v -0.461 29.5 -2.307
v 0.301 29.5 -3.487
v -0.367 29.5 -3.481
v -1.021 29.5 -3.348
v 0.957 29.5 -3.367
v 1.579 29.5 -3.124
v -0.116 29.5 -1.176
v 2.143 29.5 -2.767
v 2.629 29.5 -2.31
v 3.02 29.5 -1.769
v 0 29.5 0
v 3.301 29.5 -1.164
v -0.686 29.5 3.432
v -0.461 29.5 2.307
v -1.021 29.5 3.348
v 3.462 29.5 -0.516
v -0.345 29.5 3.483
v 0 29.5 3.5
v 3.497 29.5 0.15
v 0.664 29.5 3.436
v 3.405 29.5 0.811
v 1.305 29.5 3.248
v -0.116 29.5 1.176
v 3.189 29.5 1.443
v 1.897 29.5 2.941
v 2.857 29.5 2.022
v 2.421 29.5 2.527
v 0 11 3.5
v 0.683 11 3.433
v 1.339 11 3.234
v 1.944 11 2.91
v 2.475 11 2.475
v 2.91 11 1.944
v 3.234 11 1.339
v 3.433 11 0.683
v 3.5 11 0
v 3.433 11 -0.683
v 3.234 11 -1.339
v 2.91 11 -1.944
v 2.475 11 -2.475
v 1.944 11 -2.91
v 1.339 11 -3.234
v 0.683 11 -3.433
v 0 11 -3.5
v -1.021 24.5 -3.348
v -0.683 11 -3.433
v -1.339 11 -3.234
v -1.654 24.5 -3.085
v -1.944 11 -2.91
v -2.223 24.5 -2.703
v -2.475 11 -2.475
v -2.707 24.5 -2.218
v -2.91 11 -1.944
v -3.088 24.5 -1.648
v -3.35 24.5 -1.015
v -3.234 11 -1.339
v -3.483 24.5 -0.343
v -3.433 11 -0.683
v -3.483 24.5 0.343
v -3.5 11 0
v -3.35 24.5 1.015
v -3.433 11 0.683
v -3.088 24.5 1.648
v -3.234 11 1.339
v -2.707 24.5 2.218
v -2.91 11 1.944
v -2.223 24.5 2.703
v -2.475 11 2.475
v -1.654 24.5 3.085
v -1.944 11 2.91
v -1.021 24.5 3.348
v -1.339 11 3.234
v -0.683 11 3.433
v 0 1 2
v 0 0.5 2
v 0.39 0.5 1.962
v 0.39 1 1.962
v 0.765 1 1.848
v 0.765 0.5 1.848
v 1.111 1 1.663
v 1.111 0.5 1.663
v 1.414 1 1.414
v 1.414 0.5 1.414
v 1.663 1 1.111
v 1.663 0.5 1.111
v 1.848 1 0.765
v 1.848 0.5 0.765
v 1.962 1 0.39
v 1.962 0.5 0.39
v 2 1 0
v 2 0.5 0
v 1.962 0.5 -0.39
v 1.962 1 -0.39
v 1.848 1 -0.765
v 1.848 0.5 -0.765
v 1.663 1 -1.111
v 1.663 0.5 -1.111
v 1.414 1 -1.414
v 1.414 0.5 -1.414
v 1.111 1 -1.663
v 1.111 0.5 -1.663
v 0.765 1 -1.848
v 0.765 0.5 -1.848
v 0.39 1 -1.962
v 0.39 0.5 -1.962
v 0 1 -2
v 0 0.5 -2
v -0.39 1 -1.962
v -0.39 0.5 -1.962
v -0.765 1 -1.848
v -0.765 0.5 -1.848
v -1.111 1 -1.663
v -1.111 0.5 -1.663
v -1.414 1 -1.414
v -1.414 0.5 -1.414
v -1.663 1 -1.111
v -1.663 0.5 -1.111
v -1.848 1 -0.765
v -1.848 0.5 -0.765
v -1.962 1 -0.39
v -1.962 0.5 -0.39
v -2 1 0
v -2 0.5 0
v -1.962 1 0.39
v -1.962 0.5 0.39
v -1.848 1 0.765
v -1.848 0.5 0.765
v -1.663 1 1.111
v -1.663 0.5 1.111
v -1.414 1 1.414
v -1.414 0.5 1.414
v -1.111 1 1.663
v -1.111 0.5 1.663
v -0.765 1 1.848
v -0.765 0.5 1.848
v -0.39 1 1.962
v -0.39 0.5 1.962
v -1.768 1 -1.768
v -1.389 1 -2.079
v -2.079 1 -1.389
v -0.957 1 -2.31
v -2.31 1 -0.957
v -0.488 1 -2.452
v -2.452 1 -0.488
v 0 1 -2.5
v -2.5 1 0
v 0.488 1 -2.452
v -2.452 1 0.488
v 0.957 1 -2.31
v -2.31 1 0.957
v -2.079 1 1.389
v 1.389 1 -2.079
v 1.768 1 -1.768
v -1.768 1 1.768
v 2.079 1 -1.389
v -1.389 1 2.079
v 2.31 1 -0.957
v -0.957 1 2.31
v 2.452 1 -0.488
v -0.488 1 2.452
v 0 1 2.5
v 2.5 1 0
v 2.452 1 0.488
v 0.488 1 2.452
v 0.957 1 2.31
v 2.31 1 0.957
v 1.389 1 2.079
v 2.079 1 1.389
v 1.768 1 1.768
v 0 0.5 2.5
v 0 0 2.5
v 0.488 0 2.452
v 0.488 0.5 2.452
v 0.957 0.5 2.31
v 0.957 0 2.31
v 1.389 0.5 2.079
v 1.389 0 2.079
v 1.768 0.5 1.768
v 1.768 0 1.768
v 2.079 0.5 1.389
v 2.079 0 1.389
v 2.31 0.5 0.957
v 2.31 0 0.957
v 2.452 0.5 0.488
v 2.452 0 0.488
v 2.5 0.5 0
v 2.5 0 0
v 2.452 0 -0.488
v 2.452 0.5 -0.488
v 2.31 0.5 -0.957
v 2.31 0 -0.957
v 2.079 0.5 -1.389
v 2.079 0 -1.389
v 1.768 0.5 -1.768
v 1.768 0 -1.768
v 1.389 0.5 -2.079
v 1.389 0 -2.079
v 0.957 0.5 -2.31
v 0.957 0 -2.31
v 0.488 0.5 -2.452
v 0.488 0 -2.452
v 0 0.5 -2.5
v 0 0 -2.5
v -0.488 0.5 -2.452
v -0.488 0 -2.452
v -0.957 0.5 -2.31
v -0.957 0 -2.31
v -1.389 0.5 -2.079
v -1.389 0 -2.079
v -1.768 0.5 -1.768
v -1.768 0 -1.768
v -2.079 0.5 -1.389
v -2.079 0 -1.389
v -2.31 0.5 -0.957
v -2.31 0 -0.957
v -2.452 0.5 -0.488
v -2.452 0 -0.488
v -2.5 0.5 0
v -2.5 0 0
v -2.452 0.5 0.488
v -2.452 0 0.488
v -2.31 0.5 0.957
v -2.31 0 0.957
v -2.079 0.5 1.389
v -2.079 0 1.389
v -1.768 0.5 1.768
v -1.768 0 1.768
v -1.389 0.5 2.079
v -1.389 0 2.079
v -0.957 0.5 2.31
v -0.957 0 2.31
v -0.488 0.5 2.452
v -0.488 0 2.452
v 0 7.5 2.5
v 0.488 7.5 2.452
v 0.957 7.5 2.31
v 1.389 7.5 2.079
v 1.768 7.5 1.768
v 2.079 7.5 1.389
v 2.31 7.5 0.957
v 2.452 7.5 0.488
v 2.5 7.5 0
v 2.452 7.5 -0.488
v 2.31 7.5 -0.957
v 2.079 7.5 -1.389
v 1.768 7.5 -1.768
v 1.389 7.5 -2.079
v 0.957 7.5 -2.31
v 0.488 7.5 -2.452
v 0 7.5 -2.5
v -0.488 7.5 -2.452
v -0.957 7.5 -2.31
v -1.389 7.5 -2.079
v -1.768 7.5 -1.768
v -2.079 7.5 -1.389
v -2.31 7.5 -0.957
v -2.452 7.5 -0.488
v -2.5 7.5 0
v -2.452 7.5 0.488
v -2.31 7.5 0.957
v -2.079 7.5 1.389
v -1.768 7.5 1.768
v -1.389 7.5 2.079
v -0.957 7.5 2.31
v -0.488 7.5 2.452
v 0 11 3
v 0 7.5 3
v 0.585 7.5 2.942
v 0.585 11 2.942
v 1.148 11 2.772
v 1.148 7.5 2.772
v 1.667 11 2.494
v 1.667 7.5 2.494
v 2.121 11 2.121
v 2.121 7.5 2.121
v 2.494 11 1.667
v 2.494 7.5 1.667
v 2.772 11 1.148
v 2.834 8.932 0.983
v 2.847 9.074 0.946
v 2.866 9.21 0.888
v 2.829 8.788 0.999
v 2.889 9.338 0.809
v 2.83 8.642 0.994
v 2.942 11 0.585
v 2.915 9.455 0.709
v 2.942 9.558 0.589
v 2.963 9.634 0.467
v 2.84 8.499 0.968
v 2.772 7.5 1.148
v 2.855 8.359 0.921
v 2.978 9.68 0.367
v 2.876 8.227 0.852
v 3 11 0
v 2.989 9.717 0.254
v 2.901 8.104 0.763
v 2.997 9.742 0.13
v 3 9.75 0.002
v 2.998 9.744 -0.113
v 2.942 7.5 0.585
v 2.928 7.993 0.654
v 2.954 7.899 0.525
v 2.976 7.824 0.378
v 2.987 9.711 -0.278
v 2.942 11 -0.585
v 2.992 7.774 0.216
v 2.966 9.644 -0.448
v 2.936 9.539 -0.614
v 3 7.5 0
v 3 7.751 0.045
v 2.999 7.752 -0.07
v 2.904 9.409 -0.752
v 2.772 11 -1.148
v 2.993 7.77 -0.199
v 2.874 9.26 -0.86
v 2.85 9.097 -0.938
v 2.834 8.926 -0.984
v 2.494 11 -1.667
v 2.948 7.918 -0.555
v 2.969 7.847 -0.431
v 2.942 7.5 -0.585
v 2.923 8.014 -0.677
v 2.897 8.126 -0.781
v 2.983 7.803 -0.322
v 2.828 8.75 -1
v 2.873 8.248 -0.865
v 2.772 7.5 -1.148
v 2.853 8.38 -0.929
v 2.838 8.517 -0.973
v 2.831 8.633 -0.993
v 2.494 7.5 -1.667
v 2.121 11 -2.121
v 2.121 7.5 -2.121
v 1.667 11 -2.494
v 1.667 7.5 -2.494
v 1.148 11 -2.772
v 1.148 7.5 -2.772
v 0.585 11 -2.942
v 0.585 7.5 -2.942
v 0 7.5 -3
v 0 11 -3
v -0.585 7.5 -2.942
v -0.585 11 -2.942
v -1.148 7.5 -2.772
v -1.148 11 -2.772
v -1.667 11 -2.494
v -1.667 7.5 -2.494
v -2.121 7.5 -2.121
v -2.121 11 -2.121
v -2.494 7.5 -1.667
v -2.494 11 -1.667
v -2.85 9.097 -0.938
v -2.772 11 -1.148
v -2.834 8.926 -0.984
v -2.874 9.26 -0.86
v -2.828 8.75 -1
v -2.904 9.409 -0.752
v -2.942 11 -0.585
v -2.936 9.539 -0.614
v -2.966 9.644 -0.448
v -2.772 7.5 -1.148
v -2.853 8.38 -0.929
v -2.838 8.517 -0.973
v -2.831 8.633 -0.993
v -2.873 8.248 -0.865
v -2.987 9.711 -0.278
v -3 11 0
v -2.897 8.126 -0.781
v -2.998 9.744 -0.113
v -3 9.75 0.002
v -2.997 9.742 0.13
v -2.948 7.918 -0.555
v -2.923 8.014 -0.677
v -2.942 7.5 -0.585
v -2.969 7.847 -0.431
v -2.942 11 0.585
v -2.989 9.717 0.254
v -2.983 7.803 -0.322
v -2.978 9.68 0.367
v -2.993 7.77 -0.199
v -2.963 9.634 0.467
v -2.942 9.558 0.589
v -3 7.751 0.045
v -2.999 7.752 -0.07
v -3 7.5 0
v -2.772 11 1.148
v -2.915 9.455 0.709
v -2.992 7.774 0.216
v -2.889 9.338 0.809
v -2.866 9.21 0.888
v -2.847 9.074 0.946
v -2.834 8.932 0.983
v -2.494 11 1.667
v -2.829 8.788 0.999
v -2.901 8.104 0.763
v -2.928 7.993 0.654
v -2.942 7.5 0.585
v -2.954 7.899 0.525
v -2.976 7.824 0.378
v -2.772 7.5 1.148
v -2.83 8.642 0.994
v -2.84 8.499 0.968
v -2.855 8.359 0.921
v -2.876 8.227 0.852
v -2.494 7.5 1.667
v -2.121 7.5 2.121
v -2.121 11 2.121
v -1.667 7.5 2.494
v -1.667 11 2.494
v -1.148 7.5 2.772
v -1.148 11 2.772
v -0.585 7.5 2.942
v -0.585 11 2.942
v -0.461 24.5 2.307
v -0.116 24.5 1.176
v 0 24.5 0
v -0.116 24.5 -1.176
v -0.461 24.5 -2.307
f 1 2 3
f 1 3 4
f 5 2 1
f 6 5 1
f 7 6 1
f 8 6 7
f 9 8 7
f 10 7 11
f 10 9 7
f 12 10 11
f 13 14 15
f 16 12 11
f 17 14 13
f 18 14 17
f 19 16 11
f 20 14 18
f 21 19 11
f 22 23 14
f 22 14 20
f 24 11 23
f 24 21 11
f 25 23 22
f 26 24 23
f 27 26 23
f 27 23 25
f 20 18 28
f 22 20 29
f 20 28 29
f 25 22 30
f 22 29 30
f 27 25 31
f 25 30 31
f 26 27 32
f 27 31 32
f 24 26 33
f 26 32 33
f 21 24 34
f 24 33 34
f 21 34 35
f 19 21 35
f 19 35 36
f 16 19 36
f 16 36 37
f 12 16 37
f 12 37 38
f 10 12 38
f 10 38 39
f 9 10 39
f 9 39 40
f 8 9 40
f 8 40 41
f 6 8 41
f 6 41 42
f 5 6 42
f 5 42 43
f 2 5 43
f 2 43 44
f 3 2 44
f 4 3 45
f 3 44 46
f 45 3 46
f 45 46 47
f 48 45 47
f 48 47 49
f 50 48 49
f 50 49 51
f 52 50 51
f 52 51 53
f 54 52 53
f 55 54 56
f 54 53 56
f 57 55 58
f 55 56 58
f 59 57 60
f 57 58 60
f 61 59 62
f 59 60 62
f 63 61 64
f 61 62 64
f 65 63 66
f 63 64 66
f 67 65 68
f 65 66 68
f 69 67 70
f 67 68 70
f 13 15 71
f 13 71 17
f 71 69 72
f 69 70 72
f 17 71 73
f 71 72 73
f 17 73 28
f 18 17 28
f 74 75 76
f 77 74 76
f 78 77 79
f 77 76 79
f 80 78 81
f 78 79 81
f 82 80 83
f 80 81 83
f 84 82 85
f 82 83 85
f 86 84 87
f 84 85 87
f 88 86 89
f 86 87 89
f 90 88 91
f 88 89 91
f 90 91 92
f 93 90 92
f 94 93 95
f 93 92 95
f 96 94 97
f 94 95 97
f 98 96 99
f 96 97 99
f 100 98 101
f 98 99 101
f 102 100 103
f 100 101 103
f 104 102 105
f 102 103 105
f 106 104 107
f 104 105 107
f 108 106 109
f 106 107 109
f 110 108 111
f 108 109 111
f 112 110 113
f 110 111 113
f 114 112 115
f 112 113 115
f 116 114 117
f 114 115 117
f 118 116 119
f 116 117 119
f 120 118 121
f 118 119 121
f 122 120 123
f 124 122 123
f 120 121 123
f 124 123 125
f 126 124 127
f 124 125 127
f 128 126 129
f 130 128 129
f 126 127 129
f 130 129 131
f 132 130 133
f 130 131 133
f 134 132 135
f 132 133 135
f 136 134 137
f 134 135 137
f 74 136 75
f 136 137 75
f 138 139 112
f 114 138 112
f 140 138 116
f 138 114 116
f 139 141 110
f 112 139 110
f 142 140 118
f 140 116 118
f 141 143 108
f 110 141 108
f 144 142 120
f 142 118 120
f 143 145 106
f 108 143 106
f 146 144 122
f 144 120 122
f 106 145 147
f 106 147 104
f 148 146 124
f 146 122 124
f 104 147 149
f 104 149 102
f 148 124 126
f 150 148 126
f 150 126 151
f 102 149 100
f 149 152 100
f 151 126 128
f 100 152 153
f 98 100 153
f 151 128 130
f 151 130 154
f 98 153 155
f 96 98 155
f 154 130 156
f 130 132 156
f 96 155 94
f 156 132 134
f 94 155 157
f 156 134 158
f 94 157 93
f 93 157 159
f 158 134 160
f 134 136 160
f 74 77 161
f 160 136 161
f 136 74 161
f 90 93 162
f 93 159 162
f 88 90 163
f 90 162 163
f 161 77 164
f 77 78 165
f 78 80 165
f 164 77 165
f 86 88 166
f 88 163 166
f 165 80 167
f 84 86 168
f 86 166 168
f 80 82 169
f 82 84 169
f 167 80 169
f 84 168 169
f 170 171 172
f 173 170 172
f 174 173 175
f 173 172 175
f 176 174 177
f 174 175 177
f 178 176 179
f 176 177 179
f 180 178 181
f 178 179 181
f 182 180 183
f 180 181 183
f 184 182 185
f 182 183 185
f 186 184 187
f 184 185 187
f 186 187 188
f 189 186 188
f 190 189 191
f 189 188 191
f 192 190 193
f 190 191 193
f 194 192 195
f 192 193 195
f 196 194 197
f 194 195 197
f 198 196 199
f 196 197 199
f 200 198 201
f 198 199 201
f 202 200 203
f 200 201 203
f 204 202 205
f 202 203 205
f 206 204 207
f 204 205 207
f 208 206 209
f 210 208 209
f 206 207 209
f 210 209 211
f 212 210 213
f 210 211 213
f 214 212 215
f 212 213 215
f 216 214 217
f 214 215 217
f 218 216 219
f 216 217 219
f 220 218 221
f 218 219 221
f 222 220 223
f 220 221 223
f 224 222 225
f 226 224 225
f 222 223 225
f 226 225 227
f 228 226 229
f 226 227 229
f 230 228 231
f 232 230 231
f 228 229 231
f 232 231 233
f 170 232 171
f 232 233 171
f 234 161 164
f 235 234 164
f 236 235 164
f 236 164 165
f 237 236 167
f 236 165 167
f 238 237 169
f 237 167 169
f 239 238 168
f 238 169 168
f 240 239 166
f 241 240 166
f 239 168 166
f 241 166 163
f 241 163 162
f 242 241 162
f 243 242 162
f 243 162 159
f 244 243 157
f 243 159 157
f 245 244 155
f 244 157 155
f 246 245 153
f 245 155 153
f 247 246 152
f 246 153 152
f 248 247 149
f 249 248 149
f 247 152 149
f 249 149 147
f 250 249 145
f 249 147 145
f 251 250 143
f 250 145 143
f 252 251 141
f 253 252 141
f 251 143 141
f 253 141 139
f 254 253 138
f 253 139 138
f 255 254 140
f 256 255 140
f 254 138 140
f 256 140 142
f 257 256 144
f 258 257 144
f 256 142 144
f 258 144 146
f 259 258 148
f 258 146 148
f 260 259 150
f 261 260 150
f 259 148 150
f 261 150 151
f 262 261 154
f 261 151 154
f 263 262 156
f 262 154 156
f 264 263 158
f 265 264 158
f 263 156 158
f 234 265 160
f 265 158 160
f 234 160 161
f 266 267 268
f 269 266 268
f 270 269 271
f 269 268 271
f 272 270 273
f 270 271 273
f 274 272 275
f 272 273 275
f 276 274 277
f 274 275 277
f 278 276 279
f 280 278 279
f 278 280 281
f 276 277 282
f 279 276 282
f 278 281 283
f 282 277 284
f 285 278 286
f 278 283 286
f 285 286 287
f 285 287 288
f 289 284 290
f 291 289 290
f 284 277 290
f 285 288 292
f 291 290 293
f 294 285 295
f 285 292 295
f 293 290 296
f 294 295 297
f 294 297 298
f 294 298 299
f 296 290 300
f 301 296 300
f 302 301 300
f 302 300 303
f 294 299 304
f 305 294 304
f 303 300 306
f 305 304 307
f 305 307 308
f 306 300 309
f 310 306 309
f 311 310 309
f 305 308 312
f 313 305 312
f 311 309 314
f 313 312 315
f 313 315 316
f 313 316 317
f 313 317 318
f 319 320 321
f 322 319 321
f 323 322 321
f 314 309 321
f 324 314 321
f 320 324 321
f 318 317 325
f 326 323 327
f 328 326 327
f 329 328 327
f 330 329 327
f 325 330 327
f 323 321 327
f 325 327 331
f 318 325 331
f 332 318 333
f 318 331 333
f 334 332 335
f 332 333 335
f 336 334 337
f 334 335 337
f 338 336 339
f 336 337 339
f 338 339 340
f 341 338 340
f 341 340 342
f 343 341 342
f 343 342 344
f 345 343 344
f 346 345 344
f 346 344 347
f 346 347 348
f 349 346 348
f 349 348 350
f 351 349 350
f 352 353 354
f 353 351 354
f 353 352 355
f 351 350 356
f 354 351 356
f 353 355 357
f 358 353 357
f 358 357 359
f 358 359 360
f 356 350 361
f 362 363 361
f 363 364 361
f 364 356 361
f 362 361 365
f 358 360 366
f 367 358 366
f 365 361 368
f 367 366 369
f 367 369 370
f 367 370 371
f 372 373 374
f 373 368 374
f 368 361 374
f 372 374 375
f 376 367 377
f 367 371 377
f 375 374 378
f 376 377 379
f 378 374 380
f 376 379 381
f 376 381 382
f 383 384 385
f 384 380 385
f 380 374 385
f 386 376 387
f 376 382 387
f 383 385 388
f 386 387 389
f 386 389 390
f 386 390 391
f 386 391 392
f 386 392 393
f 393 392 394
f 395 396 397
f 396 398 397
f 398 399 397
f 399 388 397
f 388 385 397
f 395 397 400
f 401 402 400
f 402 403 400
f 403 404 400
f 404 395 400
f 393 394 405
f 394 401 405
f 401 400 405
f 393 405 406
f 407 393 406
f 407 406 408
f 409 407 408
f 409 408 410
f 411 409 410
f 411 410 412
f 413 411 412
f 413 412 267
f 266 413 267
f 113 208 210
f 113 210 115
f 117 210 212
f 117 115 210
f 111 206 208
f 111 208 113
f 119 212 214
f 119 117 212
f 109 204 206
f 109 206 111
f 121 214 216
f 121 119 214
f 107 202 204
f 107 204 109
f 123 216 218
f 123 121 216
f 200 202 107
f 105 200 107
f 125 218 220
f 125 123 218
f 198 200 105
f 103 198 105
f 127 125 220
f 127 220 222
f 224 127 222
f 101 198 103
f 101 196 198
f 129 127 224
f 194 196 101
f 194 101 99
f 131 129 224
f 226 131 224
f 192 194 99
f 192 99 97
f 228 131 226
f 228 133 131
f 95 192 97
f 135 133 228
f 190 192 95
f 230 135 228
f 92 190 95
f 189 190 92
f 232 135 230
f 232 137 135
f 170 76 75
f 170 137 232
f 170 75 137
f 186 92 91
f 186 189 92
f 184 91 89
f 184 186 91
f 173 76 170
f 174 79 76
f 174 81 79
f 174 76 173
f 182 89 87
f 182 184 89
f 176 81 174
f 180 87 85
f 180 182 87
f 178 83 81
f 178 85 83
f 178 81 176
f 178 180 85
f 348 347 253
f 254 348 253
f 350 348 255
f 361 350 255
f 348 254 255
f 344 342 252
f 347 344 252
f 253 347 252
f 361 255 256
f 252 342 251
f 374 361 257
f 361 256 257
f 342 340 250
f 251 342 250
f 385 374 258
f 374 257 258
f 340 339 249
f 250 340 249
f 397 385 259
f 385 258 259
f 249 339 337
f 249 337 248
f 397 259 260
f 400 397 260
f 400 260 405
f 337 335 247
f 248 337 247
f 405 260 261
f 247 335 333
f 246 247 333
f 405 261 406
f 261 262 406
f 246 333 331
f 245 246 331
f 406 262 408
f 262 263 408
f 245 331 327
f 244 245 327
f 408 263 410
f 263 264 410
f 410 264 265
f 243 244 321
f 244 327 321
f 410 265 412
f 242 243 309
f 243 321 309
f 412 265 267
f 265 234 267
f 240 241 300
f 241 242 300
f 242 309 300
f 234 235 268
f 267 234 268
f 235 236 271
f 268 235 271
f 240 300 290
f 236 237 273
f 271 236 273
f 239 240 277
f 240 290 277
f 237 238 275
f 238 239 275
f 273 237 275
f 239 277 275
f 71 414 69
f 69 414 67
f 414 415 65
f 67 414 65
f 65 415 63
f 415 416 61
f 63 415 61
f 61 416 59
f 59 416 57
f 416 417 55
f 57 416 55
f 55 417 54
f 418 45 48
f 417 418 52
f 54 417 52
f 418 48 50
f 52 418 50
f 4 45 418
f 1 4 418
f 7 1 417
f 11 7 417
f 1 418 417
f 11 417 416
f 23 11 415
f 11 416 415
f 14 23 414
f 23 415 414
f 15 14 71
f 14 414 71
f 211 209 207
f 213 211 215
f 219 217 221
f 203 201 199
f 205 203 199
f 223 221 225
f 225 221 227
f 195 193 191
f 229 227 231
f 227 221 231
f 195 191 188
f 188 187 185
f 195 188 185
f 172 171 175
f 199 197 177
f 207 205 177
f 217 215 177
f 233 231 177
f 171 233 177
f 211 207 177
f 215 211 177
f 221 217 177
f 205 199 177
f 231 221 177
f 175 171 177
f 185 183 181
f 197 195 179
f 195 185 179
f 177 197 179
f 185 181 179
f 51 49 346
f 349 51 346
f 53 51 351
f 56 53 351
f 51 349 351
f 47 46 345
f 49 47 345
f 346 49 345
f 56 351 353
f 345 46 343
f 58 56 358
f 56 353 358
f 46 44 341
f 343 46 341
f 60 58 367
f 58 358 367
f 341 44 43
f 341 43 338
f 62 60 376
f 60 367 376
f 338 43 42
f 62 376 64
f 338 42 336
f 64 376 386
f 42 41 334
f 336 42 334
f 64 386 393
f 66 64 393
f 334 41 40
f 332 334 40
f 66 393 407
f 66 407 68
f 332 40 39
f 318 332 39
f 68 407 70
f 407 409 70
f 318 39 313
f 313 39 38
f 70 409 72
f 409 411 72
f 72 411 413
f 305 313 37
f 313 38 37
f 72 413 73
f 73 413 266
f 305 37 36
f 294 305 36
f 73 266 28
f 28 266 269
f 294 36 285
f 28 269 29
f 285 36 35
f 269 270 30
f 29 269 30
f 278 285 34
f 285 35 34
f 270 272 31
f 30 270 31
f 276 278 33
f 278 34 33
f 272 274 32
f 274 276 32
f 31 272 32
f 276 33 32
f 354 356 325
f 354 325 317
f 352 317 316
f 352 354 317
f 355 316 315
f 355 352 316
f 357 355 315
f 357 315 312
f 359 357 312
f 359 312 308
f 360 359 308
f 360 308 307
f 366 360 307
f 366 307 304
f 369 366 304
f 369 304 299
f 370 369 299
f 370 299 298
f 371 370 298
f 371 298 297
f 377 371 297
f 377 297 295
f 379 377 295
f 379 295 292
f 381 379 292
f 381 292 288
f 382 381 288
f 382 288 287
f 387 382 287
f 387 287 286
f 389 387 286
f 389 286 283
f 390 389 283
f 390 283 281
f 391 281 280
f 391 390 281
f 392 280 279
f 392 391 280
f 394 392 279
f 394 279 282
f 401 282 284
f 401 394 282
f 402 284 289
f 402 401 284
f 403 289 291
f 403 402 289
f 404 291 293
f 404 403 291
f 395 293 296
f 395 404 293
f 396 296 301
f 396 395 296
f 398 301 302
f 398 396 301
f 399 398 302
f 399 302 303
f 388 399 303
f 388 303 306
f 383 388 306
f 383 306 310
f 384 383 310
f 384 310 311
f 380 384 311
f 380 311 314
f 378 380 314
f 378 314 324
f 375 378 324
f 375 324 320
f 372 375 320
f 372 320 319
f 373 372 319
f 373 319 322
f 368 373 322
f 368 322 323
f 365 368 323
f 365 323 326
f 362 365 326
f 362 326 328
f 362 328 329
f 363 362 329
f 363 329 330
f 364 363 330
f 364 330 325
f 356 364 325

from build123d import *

# Parameters (mm, degrees)
SKETCH1_R               = 2.5
BOSS_EXTRUDE1_DEPTH     = 0.5
SKETCH2_R               = 2
BOSS_EXTRUDE2_DEPTH     = 0.5
SKETCH3_R               = 2.5
BOSS_EXTRUDE3_DEPTH     = 6.5
SKETCH4_R               = 3
BOSS_EXTRUDE4_DEPTH     = 3.5
SKETCH5_R               = 3.5
BOSS_EXTRUDE5_DEPTH     = 18.5
CUT_EXTRUDE2_START      = 24.5
CUT_EXTRUDE2_DEPTH      = 5
CUT_EXTRUDE3_DEPTH      = 30.912372022
CUT_EXTRUDE3_DEPTH_BACK = 30.912372022
SKETCH10_R              = 1


with BuildPart() as part:
    # Sketch1 → Boss-Extrude1 (new body)
    with BuildSketch(Plane(origin=(0, 0, 0), x_dir=(1, 0, 0), z_dir=(0, 1, 0))):
        with Locations(Location((0, 0, 0), (0, 0, 270))):
            Circle(SKETCH1_R)
    extrude(amount=BOSS_EXTRUDE1_DEPTH)

    # Sketch2 → Boss-Extrude2 (add)
    with BuildSketch(Plane(origin=(0, 0.5, 0), x_dir=(1, 0, 0), z_dir=(0, 1, 0))):
        with Locations(Location((0, 0, 0), (0, 0, 270))):
            Circle(SKETCH2_R)
    extrude(amount=BOSS_EXTRUDE2_DEPTH)

    # Sketch3 → Boss-Extrude3 (add)
    with BuildSketch(Plane(origin=(0, 1, 0), x_dir=(1, 0, 0), z_dir=(0, 1, 0))):
        with Locations(Location((0, 0, 0), (0, 0, 270))):
            Circle(SKETCH3_R)
    extrude(amount=BOSS_EXTRUDE3_DEPTH)

    # Sketch4 → Boss-Extrude4 (add)
    with BuildSketch(Plane(origin=(0, 7.5, 0), x_dir=(1, 0, 0), z_dir=(0, 1, 0))):
        with Locations(Location((0, 0, 0), (0, 0, 270))):
            Circle(SKETCH4_R)
    extrude(amount=BOSS_EXTRUDE4_DEPTH)

    # Sketch5 → Boss-Extrude5 (add)
    with BuildSketch(Plane(origin=(0, 11, 0), x_dir=(1, 0, 0), z_dir=(0, 1, 0))):
        with Locations(Location((0, 0, 0), (0, 0, 270))):
            Circle(SKETCH5_R)
    extrude(amount=BOSS_EXTRUDE5_DEPTH)

    # Sketch8 → Cut-Extrude2 (cut)
    with BuildSketch(Plane(origin=(0, 0, 0), x_dir=(1, 0, 0), z_dir=(0, 1, 0)).offset(CUT_EXTRUDE2_START)):
        with BuildLine():
            ThreePointArc((-1.020833333, 3.347820083), (0, 0), (-1.020833333, -3.347820083))
            ThreePointArc((-1.020833333, -3.347820083), (-3.5, 0), (-1.020833333, 3.347820083))
        make_face()
    extrude(amount=CUT_EXTRUDE2_DEPTH, mode=Mode.SUBTRACT)

    # Sketch10 → Cut-Extrude3 (cut, two sides: drawn at the far end of the back side and taken through both)
    with BuildSketch(Plane(origin=(0, 0, 0), x_dir=(0, 0, -1), z_dir=(1, 0, 0)).offset(-CUT_EXTRUDE3_DEPTH_BACK)):
        with Locations((0, 8.75)):
            Circle(SKETCH10_R)
    extrude(amount=CUT_EXTRUDE3_DEPTH + CUT_EXTRUDE3_DEPTH_BACK, mode=Mode.SUBTRACT)


solid = part.part
